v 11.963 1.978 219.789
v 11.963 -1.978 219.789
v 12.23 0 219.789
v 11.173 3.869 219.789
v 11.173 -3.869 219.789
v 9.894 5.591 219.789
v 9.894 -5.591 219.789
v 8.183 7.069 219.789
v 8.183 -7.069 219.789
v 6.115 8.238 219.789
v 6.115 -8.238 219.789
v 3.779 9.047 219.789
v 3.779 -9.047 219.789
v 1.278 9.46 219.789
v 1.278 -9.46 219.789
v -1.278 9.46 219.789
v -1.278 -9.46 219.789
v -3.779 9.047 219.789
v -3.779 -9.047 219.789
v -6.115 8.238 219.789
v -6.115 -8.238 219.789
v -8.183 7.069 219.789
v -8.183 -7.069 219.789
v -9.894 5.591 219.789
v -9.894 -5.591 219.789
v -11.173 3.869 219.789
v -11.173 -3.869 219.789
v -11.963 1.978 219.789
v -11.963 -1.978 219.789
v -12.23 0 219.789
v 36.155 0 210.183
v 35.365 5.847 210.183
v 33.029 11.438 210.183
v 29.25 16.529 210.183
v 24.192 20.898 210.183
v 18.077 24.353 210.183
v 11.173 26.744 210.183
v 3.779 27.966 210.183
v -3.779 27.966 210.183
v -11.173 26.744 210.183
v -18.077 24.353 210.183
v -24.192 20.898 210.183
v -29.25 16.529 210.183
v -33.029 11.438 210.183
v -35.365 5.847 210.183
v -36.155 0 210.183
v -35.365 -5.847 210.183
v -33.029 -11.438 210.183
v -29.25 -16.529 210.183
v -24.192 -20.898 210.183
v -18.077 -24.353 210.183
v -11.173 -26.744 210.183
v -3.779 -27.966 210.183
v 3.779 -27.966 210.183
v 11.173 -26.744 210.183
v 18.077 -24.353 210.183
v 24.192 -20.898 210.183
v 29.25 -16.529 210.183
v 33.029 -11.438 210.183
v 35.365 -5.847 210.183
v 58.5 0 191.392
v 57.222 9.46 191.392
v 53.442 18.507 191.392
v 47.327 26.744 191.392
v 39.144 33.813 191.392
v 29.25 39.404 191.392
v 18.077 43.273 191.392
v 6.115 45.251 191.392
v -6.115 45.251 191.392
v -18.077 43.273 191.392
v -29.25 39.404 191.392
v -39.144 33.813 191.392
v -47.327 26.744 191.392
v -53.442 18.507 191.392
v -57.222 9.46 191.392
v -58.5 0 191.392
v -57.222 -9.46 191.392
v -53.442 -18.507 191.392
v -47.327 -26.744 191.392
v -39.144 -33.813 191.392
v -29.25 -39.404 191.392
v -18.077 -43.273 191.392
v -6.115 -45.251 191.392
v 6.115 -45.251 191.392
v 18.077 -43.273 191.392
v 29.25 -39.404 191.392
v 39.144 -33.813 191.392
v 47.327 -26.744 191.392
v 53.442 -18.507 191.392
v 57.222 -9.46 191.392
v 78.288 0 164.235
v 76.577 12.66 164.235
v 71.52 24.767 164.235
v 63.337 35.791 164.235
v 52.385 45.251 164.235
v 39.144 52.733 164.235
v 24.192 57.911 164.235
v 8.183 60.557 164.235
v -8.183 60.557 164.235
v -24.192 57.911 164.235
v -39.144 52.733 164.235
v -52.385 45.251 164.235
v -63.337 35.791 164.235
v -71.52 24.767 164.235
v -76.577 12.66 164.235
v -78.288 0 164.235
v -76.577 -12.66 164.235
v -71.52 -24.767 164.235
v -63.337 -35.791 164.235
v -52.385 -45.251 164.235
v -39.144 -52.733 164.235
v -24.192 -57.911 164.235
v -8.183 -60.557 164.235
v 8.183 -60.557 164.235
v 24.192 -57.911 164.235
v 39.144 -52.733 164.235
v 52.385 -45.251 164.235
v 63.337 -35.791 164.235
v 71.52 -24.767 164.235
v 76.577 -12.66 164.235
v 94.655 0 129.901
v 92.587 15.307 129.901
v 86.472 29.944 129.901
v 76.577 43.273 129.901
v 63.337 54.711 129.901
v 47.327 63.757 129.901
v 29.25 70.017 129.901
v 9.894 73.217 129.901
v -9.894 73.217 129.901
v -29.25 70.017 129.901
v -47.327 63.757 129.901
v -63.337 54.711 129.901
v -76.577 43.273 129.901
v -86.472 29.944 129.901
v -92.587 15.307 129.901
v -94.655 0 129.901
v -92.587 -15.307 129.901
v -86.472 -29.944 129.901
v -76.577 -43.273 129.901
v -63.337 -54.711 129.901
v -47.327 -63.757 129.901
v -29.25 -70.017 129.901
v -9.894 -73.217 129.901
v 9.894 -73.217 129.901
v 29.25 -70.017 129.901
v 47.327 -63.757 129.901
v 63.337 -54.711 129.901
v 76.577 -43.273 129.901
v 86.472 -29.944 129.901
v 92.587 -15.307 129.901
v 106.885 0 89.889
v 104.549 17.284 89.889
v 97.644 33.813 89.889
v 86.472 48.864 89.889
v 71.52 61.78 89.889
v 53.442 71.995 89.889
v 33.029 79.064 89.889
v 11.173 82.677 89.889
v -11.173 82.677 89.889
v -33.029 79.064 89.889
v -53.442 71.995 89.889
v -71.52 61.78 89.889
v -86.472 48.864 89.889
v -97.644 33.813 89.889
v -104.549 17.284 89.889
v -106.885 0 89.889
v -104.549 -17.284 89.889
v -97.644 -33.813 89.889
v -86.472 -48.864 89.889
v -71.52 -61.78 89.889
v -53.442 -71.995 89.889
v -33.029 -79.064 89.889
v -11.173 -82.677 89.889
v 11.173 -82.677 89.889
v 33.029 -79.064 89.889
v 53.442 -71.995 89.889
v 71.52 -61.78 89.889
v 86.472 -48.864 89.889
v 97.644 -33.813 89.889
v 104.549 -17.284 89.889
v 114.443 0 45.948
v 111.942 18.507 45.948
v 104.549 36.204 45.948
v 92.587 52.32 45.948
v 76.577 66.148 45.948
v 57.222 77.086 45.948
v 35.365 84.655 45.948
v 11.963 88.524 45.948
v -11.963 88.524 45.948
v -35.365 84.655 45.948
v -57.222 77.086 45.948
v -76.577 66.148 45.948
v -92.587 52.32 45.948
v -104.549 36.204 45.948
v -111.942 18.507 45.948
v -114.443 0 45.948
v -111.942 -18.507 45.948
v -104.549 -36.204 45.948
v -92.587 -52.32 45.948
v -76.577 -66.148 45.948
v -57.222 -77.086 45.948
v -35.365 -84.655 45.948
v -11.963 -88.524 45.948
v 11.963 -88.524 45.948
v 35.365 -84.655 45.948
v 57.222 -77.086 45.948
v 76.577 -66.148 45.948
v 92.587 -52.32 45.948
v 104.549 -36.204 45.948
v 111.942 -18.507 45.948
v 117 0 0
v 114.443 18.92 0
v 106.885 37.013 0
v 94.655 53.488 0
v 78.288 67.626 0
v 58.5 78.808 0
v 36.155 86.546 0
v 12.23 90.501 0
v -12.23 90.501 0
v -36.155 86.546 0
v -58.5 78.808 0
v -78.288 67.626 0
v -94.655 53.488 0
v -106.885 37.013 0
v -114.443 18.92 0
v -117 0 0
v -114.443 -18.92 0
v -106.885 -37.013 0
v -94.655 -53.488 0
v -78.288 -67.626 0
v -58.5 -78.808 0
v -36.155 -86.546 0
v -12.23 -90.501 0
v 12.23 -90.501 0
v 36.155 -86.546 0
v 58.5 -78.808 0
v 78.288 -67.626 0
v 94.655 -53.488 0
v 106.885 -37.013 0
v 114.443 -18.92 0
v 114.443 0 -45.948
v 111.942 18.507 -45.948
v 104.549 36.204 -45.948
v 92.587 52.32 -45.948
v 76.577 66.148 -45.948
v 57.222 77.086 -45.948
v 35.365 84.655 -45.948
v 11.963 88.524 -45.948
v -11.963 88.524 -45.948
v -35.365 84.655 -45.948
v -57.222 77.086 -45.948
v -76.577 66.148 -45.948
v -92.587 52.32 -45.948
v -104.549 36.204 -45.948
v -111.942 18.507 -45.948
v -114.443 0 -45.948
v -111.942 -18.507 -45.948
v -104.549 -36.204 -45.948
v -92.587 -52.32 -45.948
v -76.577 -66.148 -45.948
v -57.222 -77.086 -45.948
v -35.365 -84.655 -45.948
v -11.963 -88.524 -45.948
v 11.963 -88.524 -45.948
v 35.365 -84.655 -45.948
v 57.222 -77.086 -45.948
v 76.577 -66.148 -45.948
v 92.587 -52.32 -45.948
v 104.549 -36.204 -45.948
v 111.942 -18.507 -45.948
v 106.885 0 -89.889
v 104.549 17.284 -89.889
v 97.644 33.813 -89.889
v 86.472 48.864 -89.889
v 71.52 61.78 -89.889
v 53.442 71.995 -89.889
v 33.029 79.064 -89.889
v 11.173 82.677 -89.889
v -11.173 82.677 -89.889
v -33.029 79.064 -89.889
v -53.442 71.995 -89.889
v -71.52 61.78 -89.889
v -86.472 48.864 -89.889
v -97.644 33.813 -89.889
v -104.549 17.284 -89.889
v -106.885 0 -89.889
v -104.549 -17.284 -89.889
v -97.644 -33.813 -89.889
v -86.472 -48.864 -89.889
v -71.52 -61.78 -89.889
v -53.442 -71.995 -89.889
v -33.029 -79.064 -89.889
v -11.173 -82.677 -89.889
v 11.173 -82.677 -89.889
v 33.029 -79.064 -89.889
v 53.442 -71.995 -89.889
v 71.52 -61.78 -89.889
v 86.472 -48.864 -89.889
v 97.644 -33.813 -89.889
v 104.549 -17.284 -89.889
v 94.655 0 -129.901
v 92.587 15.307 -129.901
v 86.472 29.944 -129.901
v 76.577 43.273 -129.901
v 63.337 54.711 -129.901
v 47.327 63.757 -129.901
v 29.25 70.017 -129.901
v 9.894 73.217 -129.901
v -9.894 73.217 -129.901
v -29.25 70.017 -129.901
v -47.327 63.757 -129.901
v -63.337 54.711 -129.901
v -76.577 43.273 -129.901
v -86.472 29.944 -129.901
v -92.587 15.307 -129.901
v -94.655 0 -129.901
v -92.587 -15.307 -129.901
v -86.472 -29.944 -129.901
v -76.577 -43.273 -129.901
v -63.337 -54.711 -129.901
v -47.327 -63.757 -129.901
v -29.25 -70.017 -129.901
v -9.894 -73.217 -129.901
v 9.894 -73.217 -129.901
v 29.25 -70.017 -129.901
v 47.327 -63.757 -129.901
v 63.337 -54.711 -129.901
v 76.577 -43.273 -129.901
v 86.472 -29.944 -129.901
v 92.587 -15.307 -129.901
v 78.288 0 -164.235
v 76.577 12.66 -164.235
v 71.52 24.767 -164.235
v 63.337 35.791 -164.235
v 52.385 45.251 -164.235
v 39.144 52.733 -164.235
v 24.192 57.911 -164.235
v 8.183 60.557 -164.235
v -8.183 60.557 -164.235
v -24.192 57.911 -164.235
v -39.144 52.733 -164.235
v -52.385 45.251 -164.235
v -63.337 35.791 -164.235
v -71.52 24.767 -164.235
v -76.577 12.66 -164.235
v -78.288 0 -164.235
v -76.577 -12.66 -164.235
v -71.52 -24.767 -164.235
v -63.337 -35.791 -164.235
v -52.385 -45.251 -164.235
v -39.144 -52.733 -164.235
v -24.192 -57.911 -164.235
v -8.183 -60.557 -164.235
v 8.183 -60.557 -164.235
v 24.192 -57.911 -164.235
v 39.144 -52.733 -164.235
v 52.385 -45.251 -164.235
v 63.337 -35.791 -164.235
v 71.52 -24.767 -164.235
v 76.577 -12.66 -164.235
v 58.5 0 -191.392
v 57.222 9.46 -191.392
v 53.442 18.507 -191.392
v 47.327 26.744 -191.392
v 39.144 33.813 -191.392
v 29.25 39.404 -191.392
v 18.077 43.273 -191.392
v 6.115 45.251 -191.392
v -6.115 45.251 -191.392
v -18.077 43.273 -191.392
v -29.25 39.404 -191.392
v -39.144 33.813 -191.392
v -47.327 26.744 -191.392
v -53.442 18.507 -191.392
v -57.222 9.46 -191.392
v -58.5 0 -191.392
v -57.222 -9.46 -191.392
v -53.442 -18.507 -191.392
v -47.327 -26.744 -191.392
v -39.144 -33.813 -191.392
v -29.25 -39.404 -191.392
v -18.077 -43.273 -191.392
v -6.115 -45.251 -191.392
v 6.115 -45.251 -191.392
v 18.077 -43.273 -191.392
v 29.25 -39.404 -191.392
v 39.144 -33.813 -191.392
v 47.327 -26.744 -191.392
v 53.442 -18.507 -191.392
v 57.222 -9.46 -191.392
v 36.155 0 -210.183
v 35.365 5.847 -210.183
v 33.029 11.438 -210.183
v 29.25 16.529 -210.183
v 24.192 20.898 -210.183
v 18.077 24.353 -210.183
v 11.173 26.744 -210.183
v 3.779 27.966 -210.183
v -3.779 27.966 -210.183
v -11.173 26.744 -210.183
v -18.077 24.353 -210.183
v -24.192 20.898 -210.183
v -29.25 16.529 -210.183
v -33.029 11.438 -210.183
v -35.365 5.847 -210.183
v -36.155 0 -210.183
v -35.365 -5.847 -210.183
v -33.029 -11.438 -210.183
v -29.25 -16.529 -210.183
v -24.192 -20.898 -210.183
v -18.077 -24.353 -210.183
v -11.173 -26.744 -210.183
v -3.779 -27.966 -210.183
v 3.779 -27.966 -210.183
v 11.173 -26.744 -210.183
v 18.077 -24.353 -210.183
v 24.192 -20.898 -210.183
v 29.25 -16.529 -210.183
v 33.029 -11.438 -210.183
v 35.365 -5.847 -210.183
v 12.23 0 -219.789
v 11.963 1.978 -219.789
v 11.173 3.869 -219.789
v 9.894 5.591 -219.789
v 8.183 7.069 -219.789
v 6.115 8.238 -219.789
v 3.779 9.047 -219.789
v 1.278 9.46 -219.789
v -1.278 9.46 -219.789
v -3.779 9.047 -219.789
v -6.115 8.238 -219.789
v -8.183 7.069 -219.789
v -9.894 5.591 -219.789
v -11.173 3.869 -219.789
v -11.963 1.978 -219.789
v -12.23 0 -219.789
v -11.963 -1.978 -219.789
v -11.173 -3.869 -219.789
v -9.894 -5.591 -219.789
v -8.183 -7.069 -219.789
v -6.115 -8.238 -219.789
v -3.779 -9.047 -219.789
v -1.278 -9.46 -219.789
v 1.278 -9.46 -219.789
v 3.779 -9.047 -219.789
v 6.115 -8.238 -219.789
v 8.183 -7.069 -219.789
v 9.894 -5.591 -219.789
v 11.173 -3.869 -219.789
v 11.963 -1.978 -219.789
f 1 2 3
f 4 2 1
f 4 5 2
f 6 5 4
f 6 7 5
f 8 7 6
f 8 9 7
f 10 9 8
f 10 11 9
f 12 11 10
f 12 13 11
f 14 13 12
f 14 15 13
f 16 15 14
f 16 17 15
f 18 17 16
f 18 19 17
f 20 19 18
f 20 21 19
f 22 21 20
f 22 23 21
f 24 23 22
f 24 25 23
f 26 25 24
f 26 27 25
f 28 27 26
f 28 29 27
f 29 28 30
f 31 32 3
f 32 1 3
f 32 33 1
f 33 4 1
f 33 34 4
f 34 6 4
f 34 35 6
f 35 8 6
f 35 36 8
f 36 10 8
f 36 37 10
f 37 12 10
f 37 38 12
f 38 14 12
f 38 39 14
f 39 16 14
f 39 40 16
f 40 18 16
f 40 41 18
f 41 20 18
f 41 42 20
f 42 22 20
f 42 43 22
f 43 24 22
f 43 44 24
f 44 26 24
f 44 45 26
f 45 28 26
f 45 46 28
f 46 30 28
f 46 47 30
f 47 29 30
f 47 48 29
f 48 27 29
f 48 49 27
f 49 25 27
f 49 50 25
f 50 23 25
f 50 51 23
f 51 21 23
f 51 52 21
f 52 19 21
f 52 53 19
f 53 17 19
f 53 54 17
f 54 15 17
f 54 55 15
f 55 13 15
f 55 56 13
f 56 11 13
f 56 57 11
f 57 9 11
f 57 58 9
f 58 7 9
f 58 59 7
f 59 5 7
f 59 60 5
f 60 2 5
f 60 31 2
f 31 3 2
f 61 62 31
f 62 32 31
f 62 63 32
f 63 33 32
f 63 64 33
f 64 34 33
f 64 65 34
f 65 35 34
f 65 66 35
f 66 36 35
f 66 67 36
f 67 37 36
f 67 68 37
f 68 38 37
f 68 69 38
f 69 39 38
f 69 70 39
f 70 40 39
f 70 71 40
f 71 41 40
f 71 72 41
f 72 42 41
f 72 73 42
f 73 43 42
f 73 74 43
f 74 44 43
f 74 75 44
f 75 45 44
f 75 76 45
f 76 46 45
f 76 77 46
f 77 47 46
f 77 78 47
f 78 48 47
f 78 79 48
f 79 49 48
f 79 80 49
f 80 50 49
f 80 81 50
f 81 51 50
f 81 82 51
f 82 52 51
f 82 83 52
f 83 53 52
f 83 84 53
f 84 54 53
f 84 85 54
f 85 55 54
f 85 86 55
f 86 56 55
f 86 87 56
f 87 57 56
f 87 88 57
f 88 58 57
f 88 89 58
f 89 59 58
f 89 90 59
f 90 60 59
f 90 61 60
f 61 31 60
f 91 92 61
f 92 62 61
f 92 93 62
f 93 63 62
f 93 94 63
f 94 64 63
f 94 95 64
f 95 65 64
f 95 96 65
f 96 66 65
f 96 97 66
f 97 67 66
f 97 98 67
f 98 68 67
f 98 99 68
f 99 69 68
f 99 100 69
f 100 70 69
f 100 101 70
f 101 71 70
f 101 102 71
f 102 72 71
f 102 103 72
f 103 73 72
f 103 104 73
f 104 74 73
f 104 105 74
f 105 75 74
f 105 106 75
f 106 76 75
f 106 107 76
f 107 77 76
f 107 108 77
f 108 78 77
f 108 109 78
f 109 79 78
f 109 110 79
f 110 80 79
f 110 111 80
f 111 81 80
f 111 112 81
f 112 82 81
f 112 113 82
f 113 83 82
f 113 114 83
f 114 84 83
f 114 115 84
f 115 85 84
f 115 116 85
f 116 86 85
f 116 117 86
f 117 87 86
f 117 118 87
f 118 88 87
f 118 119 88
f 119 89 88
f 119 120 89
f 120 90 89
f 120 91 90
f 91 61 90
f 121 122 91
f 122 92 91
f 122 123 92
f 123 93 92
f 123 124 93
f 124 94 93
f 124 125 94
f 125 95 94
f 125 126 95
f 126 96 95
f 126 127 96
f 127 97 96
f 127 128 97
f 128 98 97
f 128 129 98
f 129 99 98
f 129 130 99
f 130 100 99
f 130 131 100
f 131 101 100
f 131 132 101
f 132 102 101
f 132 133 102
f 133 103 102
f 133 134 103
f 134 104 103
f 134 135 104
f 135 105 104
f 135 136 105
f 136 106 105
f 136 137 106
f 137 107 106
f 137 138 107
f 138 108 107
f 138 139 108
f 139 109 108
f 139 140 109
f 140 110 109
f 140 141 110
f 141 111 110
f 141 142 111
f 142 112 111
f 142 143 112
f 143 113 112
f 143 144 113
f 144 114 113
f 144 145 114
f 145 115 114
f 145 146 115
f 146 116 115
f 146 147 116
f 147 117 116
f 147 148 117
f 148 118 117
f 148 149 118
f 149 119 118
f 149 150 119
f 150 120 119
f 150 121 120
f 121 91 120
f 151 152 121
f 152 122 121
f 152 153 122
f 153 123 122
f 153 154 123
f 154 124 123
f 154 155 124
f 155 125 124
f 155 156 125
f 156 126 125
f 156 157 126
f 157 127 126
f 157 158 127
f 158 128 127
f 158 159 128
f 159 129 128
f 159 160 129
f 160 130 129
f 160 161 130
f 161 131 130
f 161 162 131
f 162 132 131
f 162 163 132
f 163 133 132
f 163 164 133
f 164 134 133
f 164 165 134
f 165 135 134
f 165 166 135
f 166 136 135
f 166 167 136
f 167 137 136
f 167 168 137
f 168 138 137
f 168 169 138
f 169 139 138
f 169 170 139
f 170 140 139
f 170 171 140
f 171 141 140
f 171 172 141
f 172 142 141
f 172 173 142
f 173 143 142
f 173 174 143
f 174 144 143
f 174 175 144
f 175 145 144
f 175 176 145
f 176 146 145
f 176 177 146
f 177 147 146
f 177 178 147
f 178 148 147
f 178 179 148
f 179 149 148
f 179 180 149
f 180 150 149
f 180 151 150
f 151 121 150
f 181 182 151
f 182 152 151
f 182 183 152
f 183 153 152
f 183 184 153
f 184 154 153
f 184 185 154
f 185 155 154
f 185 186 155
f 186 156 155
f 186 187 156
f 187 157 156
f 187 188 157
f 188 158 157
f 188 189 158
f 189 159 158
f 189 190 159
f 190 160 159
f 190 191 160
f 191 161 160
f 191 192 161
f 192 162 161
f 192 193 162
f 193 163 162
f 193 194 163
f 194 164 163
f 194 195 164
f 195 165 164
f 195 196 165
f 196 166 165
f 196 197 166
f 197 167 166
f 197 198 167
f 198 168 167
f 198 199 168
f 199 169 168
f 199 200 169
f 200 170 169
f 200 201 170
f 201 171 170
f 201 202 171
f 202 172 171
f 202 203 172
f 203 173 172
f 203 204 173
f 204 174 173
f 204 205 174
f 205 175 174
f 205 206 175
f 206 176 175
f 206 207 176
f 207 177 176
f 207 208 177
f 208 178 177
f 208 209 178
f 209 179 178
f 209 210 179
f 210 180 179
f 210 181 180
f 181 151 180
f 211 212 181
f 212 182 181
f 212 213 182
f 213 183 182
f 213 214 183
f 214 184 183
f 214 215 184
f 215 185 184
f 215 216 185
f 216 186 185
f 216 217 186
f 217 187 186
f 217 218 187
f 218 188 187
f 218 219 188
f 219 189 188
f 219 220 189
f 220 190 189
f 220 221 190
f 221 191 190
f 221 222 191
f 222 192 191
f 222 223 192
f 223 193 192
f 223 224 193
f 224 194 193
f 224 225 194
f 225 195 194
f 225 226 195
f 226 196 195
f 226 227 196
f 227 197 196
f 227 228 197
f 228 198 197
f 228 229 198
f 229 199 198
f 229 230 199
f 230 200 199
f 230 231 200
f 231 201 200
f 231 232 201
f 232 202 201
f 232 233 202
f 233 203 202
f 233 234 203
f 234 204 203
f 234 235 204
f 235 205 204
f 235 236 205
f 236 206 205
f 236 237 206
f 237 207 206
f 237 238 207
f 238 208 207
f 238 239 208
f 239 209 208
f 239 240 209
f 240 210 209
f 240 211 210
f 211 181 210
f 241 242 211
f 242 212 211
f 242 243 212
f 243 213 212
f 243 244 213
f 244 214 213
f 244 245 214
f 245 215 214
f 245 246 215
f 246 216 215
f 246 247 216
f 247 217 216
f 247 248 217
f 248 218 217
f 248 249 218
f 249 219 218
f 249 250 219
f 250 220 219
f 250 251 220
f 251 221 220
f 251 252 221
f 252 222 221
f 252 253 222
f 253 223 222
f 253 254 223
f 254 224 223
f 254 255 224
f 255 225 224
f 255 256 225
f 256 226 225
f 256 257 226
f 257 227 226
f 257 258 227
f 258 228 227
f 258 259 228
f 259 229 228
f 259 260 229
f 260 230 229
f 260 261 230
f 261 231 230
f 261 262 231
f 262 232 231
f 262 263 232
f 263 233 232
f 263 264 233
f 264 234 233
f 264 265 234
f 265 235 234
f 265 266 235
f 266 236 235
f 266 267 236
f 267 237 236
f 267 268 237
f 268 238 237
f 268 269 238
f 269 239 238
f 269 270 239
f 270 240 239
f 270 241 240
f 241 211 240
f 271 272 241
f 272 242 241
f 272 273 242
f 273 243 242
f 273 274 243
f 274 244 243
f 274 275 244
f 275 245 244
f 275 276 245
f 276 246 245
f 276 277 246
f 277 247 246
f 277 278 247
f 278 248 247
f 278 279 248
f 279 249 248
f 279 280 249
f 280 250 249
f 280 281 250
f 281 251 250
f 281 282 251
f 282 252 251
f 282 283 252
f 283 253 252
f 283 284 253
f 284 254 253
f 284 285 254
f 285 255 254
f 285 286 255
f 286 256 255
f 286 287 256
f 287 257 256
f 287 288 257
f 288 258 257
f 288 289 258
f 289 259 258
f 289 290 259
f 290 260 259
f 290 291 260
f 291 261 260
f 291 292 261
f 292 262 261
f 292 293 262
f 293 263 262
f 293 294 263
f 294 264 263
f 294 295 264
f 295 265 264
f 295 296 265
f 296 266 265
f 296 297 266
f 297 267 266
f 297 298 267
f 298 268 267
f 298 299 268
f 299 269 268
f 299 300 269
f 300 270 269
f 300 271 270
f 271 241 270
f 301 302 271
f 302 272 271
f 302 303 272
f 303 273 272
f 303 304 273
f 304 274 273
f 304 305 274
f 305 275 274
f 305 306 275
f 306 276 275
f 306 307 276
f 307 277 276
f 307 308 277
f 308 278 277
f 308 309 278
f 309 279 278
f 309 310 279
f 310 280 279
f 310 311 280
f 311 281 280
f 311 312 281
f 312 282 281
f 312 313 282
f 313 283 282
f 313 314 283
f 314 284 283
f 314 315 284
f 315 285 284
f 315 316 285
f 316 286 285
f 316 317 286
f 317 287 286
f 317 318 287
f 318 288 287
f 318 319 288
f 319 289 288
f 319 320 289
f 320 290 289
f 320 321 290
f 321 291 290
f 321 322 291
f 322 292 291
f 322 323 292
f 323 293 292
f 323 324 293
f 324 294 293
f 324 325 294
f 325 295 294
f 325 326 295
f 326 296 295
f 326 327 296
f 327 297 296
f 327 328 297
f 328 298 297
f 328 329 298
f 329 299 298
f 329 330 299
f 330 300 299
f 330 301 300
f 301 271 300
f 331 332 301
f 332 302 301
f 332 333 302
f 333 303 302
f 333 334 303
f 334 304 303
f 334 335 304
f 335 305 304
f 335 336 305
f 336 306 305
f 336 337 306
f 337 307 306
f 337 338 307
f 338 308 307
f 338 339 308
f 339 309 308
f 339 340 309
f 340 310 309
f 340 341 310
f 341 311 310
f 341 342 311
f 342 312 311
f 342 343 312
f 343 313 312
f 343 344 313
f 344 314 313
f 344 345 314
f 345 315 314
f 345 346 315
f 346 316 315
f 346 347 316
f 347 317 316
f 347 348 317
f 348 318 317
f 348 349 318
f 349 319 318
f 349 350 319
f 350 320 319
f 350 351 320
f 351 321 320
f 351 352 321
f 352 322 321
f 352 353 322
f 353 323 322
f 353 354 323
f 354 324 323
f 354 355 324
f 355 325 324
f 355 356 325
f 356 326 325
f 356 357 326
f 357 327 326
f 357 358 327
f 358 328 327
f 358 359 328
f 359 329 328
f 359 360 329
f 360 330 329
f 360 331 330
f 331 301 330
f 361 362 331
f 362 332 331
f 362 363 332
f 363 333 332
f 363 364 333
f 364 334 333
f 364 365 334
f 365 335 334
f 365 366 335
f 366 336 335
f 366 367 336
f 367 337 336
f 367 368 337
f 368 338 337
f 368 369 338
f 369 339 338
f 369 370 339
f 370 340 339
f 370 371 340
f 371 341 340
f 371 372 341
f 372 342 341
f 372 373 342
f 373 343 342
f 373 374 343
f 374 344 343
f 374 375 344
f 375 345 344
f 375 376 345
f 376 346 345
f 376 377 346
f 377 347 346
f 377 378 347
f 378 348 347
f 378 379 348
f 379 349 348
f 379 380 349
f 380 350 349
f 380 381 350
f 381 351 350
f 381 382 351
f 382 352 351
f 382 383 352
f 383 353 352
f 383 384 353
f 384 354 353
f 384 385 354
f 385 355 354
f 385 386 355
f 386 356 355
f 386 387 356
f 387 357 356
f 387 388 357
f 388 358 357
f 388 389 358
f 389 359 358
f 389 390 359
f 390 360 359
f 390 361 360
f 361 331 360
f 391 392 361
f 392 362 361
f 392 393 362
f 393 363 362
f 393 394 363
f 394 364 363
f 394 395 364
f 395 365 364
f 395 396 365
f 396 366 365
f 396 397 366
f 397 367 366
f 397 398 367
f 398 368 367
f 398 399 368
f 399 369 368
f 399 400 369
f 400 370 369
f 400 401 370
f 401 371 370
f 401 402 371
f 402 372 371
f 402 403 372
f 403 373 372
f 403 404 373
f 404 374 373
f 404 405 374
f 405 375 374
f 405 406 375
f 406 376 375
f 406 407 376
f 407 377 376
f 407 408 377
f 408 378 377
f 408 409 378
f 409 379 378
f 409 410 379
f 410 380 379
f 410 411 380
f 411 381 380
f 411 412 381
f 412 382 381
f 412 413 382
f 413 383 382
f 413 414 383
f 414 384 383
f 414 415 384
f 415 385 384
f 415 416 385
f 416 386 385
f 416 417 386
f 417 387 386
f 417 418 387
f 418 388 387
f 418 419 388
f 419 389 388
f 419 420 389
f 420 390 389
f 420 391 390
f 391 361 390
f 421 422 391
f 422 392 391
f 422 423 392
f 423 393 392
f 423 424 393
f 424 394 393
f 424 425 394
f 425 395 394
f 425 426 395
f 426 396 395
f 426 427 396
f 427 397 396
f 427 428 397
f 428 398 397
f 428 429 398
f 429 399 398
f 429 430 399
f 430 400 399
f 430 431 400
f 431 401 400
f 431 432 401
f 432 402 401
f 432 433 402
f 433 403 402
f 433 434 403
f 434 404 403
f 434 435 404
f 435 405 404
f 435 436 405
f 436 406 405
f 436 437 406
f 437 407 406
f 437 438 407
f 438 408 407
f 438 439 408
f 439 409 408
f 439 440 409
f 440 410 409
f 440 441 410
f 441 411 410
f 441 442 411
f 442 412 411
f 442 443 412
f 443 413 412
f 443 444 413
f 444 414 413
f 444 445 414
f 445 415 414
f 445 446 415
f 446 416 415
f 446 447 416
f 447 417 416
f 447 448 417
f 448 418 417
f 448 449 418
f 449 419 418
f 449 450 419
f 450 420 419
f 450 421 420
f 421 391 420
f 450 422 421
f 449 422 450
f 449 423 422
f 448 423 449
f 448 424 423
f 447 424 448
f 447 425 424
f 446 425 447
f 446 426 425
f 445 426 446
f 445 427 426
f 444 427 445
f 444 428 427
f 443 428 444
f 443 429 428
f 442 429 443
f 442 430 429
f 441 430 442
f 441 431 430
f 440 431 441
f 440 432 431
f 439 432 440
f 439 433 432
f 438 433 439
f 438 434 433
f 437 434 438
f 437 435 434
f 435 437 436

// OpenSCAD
// Generated by SolidPython 1.0.1 on 2020-07-29 00:46:48


scale(v = [9, 7, 17]) {
	sphere(r = 13);
}
/***********************************************
*********      SolidPython code:      **********
************************************************
 
# import packages: SolidPython
from solid import *
from solid.utils import *
from itertools import chain, combinations, permutations


class Resize:

    def __init__(self, scad_file):
        self.scad_file = scad_file
        #self.scad_file = import_scad(scad_file)
        # cone/cylinder param:
        self.r1 = 0
        self.r2 = 0
        self.h = 0
        # rectangular prism param:
        self.w = 0
        self.l = 0
        # ellipse param:
        self.r = 0

    # import OpenScad code (file name corresponds to shape)


    # classify shape + parameters
    def assign(self, param1, param2, param3):
        if self.scad_file == 'cone.scad':
            self.r1 = param1
            self.r2 = param2
            self.h = param3
        elif self.scad_file == 'cylinder.scad':
            self.r1 = param1
            self.r2 = param2
            self.h = param3
        elif self.scad_file == 'rectangularPrism.scad':
            self.h = param1
            self.l = param2
            self.w = param3
        else:
            self.r = param1
            self.h = param2

    # resize parameters
    def iterate(self):
        x = range(3, 20, 2)
        i = 1
        if self.scad_file == 'cone.scad':
            tempList = list(permutations(x, 2))
            for temp in tempList:
                param1 = temp[0]
                param2 = temp[1]
                filepath = 'produced_scad_files/' + 'cone' + str(param1) + '_' + str(param2) + '_' + '.scad'
                scad_render_to_file(cylinder(h=param1, r1=param2, r2=0), filepath)

        elif self.scad_file == 'cylinder.scad':
            tempList = list(permutations(x, 3))
            for temp in tempList:
                param1 = temp[0]
                param2 = temp[1]
                filepath = 'produced_scad_files/' + 'cylinder' + str(param1) + '_' + str(param2) + '_' + '.scad'
                scad_render_to_file(cylinder(h=param1, r1=param2, r2=param2), filepath)

        elif self.scad_file == 'rectangularPrism.scad':
            tempList = list(permutations(x, 3))
            for temp in tempList:
                param1 = temp[0]
                param2 = temp[1]
                param3 = temp[2]
                filepath = 'produced_scad_files/' + 'rectangularPrism' + str(param1) + '_' + str(param2) + '_' + str(
                    param3) + '.scad'
                scad_render_to_file(cube(size=(param1, param2, param3)), filepath)

        elif self.scad_file == 'ellipse.scad':
            tempList = list(permutations(x, 4))
            for temp in tempList:
                param1 = temp[0]
                param2 = temp[1]
                param3 = temp[2]
                param4 = temp[3]
                filepath = 'produced_scad_files/' + 'ellipse' + str(param1) + '_' + str(param2) + '_' + str(param3) + '_' + str(param4) + '.scad'
                scad_render_to_file(scale([param1, param2, param3])(sphere(r=param4)), filepath)

    def render_to_scadfile(self):
        scad_render_to_file(scad, 'example.scad') 
 
************************************************/
